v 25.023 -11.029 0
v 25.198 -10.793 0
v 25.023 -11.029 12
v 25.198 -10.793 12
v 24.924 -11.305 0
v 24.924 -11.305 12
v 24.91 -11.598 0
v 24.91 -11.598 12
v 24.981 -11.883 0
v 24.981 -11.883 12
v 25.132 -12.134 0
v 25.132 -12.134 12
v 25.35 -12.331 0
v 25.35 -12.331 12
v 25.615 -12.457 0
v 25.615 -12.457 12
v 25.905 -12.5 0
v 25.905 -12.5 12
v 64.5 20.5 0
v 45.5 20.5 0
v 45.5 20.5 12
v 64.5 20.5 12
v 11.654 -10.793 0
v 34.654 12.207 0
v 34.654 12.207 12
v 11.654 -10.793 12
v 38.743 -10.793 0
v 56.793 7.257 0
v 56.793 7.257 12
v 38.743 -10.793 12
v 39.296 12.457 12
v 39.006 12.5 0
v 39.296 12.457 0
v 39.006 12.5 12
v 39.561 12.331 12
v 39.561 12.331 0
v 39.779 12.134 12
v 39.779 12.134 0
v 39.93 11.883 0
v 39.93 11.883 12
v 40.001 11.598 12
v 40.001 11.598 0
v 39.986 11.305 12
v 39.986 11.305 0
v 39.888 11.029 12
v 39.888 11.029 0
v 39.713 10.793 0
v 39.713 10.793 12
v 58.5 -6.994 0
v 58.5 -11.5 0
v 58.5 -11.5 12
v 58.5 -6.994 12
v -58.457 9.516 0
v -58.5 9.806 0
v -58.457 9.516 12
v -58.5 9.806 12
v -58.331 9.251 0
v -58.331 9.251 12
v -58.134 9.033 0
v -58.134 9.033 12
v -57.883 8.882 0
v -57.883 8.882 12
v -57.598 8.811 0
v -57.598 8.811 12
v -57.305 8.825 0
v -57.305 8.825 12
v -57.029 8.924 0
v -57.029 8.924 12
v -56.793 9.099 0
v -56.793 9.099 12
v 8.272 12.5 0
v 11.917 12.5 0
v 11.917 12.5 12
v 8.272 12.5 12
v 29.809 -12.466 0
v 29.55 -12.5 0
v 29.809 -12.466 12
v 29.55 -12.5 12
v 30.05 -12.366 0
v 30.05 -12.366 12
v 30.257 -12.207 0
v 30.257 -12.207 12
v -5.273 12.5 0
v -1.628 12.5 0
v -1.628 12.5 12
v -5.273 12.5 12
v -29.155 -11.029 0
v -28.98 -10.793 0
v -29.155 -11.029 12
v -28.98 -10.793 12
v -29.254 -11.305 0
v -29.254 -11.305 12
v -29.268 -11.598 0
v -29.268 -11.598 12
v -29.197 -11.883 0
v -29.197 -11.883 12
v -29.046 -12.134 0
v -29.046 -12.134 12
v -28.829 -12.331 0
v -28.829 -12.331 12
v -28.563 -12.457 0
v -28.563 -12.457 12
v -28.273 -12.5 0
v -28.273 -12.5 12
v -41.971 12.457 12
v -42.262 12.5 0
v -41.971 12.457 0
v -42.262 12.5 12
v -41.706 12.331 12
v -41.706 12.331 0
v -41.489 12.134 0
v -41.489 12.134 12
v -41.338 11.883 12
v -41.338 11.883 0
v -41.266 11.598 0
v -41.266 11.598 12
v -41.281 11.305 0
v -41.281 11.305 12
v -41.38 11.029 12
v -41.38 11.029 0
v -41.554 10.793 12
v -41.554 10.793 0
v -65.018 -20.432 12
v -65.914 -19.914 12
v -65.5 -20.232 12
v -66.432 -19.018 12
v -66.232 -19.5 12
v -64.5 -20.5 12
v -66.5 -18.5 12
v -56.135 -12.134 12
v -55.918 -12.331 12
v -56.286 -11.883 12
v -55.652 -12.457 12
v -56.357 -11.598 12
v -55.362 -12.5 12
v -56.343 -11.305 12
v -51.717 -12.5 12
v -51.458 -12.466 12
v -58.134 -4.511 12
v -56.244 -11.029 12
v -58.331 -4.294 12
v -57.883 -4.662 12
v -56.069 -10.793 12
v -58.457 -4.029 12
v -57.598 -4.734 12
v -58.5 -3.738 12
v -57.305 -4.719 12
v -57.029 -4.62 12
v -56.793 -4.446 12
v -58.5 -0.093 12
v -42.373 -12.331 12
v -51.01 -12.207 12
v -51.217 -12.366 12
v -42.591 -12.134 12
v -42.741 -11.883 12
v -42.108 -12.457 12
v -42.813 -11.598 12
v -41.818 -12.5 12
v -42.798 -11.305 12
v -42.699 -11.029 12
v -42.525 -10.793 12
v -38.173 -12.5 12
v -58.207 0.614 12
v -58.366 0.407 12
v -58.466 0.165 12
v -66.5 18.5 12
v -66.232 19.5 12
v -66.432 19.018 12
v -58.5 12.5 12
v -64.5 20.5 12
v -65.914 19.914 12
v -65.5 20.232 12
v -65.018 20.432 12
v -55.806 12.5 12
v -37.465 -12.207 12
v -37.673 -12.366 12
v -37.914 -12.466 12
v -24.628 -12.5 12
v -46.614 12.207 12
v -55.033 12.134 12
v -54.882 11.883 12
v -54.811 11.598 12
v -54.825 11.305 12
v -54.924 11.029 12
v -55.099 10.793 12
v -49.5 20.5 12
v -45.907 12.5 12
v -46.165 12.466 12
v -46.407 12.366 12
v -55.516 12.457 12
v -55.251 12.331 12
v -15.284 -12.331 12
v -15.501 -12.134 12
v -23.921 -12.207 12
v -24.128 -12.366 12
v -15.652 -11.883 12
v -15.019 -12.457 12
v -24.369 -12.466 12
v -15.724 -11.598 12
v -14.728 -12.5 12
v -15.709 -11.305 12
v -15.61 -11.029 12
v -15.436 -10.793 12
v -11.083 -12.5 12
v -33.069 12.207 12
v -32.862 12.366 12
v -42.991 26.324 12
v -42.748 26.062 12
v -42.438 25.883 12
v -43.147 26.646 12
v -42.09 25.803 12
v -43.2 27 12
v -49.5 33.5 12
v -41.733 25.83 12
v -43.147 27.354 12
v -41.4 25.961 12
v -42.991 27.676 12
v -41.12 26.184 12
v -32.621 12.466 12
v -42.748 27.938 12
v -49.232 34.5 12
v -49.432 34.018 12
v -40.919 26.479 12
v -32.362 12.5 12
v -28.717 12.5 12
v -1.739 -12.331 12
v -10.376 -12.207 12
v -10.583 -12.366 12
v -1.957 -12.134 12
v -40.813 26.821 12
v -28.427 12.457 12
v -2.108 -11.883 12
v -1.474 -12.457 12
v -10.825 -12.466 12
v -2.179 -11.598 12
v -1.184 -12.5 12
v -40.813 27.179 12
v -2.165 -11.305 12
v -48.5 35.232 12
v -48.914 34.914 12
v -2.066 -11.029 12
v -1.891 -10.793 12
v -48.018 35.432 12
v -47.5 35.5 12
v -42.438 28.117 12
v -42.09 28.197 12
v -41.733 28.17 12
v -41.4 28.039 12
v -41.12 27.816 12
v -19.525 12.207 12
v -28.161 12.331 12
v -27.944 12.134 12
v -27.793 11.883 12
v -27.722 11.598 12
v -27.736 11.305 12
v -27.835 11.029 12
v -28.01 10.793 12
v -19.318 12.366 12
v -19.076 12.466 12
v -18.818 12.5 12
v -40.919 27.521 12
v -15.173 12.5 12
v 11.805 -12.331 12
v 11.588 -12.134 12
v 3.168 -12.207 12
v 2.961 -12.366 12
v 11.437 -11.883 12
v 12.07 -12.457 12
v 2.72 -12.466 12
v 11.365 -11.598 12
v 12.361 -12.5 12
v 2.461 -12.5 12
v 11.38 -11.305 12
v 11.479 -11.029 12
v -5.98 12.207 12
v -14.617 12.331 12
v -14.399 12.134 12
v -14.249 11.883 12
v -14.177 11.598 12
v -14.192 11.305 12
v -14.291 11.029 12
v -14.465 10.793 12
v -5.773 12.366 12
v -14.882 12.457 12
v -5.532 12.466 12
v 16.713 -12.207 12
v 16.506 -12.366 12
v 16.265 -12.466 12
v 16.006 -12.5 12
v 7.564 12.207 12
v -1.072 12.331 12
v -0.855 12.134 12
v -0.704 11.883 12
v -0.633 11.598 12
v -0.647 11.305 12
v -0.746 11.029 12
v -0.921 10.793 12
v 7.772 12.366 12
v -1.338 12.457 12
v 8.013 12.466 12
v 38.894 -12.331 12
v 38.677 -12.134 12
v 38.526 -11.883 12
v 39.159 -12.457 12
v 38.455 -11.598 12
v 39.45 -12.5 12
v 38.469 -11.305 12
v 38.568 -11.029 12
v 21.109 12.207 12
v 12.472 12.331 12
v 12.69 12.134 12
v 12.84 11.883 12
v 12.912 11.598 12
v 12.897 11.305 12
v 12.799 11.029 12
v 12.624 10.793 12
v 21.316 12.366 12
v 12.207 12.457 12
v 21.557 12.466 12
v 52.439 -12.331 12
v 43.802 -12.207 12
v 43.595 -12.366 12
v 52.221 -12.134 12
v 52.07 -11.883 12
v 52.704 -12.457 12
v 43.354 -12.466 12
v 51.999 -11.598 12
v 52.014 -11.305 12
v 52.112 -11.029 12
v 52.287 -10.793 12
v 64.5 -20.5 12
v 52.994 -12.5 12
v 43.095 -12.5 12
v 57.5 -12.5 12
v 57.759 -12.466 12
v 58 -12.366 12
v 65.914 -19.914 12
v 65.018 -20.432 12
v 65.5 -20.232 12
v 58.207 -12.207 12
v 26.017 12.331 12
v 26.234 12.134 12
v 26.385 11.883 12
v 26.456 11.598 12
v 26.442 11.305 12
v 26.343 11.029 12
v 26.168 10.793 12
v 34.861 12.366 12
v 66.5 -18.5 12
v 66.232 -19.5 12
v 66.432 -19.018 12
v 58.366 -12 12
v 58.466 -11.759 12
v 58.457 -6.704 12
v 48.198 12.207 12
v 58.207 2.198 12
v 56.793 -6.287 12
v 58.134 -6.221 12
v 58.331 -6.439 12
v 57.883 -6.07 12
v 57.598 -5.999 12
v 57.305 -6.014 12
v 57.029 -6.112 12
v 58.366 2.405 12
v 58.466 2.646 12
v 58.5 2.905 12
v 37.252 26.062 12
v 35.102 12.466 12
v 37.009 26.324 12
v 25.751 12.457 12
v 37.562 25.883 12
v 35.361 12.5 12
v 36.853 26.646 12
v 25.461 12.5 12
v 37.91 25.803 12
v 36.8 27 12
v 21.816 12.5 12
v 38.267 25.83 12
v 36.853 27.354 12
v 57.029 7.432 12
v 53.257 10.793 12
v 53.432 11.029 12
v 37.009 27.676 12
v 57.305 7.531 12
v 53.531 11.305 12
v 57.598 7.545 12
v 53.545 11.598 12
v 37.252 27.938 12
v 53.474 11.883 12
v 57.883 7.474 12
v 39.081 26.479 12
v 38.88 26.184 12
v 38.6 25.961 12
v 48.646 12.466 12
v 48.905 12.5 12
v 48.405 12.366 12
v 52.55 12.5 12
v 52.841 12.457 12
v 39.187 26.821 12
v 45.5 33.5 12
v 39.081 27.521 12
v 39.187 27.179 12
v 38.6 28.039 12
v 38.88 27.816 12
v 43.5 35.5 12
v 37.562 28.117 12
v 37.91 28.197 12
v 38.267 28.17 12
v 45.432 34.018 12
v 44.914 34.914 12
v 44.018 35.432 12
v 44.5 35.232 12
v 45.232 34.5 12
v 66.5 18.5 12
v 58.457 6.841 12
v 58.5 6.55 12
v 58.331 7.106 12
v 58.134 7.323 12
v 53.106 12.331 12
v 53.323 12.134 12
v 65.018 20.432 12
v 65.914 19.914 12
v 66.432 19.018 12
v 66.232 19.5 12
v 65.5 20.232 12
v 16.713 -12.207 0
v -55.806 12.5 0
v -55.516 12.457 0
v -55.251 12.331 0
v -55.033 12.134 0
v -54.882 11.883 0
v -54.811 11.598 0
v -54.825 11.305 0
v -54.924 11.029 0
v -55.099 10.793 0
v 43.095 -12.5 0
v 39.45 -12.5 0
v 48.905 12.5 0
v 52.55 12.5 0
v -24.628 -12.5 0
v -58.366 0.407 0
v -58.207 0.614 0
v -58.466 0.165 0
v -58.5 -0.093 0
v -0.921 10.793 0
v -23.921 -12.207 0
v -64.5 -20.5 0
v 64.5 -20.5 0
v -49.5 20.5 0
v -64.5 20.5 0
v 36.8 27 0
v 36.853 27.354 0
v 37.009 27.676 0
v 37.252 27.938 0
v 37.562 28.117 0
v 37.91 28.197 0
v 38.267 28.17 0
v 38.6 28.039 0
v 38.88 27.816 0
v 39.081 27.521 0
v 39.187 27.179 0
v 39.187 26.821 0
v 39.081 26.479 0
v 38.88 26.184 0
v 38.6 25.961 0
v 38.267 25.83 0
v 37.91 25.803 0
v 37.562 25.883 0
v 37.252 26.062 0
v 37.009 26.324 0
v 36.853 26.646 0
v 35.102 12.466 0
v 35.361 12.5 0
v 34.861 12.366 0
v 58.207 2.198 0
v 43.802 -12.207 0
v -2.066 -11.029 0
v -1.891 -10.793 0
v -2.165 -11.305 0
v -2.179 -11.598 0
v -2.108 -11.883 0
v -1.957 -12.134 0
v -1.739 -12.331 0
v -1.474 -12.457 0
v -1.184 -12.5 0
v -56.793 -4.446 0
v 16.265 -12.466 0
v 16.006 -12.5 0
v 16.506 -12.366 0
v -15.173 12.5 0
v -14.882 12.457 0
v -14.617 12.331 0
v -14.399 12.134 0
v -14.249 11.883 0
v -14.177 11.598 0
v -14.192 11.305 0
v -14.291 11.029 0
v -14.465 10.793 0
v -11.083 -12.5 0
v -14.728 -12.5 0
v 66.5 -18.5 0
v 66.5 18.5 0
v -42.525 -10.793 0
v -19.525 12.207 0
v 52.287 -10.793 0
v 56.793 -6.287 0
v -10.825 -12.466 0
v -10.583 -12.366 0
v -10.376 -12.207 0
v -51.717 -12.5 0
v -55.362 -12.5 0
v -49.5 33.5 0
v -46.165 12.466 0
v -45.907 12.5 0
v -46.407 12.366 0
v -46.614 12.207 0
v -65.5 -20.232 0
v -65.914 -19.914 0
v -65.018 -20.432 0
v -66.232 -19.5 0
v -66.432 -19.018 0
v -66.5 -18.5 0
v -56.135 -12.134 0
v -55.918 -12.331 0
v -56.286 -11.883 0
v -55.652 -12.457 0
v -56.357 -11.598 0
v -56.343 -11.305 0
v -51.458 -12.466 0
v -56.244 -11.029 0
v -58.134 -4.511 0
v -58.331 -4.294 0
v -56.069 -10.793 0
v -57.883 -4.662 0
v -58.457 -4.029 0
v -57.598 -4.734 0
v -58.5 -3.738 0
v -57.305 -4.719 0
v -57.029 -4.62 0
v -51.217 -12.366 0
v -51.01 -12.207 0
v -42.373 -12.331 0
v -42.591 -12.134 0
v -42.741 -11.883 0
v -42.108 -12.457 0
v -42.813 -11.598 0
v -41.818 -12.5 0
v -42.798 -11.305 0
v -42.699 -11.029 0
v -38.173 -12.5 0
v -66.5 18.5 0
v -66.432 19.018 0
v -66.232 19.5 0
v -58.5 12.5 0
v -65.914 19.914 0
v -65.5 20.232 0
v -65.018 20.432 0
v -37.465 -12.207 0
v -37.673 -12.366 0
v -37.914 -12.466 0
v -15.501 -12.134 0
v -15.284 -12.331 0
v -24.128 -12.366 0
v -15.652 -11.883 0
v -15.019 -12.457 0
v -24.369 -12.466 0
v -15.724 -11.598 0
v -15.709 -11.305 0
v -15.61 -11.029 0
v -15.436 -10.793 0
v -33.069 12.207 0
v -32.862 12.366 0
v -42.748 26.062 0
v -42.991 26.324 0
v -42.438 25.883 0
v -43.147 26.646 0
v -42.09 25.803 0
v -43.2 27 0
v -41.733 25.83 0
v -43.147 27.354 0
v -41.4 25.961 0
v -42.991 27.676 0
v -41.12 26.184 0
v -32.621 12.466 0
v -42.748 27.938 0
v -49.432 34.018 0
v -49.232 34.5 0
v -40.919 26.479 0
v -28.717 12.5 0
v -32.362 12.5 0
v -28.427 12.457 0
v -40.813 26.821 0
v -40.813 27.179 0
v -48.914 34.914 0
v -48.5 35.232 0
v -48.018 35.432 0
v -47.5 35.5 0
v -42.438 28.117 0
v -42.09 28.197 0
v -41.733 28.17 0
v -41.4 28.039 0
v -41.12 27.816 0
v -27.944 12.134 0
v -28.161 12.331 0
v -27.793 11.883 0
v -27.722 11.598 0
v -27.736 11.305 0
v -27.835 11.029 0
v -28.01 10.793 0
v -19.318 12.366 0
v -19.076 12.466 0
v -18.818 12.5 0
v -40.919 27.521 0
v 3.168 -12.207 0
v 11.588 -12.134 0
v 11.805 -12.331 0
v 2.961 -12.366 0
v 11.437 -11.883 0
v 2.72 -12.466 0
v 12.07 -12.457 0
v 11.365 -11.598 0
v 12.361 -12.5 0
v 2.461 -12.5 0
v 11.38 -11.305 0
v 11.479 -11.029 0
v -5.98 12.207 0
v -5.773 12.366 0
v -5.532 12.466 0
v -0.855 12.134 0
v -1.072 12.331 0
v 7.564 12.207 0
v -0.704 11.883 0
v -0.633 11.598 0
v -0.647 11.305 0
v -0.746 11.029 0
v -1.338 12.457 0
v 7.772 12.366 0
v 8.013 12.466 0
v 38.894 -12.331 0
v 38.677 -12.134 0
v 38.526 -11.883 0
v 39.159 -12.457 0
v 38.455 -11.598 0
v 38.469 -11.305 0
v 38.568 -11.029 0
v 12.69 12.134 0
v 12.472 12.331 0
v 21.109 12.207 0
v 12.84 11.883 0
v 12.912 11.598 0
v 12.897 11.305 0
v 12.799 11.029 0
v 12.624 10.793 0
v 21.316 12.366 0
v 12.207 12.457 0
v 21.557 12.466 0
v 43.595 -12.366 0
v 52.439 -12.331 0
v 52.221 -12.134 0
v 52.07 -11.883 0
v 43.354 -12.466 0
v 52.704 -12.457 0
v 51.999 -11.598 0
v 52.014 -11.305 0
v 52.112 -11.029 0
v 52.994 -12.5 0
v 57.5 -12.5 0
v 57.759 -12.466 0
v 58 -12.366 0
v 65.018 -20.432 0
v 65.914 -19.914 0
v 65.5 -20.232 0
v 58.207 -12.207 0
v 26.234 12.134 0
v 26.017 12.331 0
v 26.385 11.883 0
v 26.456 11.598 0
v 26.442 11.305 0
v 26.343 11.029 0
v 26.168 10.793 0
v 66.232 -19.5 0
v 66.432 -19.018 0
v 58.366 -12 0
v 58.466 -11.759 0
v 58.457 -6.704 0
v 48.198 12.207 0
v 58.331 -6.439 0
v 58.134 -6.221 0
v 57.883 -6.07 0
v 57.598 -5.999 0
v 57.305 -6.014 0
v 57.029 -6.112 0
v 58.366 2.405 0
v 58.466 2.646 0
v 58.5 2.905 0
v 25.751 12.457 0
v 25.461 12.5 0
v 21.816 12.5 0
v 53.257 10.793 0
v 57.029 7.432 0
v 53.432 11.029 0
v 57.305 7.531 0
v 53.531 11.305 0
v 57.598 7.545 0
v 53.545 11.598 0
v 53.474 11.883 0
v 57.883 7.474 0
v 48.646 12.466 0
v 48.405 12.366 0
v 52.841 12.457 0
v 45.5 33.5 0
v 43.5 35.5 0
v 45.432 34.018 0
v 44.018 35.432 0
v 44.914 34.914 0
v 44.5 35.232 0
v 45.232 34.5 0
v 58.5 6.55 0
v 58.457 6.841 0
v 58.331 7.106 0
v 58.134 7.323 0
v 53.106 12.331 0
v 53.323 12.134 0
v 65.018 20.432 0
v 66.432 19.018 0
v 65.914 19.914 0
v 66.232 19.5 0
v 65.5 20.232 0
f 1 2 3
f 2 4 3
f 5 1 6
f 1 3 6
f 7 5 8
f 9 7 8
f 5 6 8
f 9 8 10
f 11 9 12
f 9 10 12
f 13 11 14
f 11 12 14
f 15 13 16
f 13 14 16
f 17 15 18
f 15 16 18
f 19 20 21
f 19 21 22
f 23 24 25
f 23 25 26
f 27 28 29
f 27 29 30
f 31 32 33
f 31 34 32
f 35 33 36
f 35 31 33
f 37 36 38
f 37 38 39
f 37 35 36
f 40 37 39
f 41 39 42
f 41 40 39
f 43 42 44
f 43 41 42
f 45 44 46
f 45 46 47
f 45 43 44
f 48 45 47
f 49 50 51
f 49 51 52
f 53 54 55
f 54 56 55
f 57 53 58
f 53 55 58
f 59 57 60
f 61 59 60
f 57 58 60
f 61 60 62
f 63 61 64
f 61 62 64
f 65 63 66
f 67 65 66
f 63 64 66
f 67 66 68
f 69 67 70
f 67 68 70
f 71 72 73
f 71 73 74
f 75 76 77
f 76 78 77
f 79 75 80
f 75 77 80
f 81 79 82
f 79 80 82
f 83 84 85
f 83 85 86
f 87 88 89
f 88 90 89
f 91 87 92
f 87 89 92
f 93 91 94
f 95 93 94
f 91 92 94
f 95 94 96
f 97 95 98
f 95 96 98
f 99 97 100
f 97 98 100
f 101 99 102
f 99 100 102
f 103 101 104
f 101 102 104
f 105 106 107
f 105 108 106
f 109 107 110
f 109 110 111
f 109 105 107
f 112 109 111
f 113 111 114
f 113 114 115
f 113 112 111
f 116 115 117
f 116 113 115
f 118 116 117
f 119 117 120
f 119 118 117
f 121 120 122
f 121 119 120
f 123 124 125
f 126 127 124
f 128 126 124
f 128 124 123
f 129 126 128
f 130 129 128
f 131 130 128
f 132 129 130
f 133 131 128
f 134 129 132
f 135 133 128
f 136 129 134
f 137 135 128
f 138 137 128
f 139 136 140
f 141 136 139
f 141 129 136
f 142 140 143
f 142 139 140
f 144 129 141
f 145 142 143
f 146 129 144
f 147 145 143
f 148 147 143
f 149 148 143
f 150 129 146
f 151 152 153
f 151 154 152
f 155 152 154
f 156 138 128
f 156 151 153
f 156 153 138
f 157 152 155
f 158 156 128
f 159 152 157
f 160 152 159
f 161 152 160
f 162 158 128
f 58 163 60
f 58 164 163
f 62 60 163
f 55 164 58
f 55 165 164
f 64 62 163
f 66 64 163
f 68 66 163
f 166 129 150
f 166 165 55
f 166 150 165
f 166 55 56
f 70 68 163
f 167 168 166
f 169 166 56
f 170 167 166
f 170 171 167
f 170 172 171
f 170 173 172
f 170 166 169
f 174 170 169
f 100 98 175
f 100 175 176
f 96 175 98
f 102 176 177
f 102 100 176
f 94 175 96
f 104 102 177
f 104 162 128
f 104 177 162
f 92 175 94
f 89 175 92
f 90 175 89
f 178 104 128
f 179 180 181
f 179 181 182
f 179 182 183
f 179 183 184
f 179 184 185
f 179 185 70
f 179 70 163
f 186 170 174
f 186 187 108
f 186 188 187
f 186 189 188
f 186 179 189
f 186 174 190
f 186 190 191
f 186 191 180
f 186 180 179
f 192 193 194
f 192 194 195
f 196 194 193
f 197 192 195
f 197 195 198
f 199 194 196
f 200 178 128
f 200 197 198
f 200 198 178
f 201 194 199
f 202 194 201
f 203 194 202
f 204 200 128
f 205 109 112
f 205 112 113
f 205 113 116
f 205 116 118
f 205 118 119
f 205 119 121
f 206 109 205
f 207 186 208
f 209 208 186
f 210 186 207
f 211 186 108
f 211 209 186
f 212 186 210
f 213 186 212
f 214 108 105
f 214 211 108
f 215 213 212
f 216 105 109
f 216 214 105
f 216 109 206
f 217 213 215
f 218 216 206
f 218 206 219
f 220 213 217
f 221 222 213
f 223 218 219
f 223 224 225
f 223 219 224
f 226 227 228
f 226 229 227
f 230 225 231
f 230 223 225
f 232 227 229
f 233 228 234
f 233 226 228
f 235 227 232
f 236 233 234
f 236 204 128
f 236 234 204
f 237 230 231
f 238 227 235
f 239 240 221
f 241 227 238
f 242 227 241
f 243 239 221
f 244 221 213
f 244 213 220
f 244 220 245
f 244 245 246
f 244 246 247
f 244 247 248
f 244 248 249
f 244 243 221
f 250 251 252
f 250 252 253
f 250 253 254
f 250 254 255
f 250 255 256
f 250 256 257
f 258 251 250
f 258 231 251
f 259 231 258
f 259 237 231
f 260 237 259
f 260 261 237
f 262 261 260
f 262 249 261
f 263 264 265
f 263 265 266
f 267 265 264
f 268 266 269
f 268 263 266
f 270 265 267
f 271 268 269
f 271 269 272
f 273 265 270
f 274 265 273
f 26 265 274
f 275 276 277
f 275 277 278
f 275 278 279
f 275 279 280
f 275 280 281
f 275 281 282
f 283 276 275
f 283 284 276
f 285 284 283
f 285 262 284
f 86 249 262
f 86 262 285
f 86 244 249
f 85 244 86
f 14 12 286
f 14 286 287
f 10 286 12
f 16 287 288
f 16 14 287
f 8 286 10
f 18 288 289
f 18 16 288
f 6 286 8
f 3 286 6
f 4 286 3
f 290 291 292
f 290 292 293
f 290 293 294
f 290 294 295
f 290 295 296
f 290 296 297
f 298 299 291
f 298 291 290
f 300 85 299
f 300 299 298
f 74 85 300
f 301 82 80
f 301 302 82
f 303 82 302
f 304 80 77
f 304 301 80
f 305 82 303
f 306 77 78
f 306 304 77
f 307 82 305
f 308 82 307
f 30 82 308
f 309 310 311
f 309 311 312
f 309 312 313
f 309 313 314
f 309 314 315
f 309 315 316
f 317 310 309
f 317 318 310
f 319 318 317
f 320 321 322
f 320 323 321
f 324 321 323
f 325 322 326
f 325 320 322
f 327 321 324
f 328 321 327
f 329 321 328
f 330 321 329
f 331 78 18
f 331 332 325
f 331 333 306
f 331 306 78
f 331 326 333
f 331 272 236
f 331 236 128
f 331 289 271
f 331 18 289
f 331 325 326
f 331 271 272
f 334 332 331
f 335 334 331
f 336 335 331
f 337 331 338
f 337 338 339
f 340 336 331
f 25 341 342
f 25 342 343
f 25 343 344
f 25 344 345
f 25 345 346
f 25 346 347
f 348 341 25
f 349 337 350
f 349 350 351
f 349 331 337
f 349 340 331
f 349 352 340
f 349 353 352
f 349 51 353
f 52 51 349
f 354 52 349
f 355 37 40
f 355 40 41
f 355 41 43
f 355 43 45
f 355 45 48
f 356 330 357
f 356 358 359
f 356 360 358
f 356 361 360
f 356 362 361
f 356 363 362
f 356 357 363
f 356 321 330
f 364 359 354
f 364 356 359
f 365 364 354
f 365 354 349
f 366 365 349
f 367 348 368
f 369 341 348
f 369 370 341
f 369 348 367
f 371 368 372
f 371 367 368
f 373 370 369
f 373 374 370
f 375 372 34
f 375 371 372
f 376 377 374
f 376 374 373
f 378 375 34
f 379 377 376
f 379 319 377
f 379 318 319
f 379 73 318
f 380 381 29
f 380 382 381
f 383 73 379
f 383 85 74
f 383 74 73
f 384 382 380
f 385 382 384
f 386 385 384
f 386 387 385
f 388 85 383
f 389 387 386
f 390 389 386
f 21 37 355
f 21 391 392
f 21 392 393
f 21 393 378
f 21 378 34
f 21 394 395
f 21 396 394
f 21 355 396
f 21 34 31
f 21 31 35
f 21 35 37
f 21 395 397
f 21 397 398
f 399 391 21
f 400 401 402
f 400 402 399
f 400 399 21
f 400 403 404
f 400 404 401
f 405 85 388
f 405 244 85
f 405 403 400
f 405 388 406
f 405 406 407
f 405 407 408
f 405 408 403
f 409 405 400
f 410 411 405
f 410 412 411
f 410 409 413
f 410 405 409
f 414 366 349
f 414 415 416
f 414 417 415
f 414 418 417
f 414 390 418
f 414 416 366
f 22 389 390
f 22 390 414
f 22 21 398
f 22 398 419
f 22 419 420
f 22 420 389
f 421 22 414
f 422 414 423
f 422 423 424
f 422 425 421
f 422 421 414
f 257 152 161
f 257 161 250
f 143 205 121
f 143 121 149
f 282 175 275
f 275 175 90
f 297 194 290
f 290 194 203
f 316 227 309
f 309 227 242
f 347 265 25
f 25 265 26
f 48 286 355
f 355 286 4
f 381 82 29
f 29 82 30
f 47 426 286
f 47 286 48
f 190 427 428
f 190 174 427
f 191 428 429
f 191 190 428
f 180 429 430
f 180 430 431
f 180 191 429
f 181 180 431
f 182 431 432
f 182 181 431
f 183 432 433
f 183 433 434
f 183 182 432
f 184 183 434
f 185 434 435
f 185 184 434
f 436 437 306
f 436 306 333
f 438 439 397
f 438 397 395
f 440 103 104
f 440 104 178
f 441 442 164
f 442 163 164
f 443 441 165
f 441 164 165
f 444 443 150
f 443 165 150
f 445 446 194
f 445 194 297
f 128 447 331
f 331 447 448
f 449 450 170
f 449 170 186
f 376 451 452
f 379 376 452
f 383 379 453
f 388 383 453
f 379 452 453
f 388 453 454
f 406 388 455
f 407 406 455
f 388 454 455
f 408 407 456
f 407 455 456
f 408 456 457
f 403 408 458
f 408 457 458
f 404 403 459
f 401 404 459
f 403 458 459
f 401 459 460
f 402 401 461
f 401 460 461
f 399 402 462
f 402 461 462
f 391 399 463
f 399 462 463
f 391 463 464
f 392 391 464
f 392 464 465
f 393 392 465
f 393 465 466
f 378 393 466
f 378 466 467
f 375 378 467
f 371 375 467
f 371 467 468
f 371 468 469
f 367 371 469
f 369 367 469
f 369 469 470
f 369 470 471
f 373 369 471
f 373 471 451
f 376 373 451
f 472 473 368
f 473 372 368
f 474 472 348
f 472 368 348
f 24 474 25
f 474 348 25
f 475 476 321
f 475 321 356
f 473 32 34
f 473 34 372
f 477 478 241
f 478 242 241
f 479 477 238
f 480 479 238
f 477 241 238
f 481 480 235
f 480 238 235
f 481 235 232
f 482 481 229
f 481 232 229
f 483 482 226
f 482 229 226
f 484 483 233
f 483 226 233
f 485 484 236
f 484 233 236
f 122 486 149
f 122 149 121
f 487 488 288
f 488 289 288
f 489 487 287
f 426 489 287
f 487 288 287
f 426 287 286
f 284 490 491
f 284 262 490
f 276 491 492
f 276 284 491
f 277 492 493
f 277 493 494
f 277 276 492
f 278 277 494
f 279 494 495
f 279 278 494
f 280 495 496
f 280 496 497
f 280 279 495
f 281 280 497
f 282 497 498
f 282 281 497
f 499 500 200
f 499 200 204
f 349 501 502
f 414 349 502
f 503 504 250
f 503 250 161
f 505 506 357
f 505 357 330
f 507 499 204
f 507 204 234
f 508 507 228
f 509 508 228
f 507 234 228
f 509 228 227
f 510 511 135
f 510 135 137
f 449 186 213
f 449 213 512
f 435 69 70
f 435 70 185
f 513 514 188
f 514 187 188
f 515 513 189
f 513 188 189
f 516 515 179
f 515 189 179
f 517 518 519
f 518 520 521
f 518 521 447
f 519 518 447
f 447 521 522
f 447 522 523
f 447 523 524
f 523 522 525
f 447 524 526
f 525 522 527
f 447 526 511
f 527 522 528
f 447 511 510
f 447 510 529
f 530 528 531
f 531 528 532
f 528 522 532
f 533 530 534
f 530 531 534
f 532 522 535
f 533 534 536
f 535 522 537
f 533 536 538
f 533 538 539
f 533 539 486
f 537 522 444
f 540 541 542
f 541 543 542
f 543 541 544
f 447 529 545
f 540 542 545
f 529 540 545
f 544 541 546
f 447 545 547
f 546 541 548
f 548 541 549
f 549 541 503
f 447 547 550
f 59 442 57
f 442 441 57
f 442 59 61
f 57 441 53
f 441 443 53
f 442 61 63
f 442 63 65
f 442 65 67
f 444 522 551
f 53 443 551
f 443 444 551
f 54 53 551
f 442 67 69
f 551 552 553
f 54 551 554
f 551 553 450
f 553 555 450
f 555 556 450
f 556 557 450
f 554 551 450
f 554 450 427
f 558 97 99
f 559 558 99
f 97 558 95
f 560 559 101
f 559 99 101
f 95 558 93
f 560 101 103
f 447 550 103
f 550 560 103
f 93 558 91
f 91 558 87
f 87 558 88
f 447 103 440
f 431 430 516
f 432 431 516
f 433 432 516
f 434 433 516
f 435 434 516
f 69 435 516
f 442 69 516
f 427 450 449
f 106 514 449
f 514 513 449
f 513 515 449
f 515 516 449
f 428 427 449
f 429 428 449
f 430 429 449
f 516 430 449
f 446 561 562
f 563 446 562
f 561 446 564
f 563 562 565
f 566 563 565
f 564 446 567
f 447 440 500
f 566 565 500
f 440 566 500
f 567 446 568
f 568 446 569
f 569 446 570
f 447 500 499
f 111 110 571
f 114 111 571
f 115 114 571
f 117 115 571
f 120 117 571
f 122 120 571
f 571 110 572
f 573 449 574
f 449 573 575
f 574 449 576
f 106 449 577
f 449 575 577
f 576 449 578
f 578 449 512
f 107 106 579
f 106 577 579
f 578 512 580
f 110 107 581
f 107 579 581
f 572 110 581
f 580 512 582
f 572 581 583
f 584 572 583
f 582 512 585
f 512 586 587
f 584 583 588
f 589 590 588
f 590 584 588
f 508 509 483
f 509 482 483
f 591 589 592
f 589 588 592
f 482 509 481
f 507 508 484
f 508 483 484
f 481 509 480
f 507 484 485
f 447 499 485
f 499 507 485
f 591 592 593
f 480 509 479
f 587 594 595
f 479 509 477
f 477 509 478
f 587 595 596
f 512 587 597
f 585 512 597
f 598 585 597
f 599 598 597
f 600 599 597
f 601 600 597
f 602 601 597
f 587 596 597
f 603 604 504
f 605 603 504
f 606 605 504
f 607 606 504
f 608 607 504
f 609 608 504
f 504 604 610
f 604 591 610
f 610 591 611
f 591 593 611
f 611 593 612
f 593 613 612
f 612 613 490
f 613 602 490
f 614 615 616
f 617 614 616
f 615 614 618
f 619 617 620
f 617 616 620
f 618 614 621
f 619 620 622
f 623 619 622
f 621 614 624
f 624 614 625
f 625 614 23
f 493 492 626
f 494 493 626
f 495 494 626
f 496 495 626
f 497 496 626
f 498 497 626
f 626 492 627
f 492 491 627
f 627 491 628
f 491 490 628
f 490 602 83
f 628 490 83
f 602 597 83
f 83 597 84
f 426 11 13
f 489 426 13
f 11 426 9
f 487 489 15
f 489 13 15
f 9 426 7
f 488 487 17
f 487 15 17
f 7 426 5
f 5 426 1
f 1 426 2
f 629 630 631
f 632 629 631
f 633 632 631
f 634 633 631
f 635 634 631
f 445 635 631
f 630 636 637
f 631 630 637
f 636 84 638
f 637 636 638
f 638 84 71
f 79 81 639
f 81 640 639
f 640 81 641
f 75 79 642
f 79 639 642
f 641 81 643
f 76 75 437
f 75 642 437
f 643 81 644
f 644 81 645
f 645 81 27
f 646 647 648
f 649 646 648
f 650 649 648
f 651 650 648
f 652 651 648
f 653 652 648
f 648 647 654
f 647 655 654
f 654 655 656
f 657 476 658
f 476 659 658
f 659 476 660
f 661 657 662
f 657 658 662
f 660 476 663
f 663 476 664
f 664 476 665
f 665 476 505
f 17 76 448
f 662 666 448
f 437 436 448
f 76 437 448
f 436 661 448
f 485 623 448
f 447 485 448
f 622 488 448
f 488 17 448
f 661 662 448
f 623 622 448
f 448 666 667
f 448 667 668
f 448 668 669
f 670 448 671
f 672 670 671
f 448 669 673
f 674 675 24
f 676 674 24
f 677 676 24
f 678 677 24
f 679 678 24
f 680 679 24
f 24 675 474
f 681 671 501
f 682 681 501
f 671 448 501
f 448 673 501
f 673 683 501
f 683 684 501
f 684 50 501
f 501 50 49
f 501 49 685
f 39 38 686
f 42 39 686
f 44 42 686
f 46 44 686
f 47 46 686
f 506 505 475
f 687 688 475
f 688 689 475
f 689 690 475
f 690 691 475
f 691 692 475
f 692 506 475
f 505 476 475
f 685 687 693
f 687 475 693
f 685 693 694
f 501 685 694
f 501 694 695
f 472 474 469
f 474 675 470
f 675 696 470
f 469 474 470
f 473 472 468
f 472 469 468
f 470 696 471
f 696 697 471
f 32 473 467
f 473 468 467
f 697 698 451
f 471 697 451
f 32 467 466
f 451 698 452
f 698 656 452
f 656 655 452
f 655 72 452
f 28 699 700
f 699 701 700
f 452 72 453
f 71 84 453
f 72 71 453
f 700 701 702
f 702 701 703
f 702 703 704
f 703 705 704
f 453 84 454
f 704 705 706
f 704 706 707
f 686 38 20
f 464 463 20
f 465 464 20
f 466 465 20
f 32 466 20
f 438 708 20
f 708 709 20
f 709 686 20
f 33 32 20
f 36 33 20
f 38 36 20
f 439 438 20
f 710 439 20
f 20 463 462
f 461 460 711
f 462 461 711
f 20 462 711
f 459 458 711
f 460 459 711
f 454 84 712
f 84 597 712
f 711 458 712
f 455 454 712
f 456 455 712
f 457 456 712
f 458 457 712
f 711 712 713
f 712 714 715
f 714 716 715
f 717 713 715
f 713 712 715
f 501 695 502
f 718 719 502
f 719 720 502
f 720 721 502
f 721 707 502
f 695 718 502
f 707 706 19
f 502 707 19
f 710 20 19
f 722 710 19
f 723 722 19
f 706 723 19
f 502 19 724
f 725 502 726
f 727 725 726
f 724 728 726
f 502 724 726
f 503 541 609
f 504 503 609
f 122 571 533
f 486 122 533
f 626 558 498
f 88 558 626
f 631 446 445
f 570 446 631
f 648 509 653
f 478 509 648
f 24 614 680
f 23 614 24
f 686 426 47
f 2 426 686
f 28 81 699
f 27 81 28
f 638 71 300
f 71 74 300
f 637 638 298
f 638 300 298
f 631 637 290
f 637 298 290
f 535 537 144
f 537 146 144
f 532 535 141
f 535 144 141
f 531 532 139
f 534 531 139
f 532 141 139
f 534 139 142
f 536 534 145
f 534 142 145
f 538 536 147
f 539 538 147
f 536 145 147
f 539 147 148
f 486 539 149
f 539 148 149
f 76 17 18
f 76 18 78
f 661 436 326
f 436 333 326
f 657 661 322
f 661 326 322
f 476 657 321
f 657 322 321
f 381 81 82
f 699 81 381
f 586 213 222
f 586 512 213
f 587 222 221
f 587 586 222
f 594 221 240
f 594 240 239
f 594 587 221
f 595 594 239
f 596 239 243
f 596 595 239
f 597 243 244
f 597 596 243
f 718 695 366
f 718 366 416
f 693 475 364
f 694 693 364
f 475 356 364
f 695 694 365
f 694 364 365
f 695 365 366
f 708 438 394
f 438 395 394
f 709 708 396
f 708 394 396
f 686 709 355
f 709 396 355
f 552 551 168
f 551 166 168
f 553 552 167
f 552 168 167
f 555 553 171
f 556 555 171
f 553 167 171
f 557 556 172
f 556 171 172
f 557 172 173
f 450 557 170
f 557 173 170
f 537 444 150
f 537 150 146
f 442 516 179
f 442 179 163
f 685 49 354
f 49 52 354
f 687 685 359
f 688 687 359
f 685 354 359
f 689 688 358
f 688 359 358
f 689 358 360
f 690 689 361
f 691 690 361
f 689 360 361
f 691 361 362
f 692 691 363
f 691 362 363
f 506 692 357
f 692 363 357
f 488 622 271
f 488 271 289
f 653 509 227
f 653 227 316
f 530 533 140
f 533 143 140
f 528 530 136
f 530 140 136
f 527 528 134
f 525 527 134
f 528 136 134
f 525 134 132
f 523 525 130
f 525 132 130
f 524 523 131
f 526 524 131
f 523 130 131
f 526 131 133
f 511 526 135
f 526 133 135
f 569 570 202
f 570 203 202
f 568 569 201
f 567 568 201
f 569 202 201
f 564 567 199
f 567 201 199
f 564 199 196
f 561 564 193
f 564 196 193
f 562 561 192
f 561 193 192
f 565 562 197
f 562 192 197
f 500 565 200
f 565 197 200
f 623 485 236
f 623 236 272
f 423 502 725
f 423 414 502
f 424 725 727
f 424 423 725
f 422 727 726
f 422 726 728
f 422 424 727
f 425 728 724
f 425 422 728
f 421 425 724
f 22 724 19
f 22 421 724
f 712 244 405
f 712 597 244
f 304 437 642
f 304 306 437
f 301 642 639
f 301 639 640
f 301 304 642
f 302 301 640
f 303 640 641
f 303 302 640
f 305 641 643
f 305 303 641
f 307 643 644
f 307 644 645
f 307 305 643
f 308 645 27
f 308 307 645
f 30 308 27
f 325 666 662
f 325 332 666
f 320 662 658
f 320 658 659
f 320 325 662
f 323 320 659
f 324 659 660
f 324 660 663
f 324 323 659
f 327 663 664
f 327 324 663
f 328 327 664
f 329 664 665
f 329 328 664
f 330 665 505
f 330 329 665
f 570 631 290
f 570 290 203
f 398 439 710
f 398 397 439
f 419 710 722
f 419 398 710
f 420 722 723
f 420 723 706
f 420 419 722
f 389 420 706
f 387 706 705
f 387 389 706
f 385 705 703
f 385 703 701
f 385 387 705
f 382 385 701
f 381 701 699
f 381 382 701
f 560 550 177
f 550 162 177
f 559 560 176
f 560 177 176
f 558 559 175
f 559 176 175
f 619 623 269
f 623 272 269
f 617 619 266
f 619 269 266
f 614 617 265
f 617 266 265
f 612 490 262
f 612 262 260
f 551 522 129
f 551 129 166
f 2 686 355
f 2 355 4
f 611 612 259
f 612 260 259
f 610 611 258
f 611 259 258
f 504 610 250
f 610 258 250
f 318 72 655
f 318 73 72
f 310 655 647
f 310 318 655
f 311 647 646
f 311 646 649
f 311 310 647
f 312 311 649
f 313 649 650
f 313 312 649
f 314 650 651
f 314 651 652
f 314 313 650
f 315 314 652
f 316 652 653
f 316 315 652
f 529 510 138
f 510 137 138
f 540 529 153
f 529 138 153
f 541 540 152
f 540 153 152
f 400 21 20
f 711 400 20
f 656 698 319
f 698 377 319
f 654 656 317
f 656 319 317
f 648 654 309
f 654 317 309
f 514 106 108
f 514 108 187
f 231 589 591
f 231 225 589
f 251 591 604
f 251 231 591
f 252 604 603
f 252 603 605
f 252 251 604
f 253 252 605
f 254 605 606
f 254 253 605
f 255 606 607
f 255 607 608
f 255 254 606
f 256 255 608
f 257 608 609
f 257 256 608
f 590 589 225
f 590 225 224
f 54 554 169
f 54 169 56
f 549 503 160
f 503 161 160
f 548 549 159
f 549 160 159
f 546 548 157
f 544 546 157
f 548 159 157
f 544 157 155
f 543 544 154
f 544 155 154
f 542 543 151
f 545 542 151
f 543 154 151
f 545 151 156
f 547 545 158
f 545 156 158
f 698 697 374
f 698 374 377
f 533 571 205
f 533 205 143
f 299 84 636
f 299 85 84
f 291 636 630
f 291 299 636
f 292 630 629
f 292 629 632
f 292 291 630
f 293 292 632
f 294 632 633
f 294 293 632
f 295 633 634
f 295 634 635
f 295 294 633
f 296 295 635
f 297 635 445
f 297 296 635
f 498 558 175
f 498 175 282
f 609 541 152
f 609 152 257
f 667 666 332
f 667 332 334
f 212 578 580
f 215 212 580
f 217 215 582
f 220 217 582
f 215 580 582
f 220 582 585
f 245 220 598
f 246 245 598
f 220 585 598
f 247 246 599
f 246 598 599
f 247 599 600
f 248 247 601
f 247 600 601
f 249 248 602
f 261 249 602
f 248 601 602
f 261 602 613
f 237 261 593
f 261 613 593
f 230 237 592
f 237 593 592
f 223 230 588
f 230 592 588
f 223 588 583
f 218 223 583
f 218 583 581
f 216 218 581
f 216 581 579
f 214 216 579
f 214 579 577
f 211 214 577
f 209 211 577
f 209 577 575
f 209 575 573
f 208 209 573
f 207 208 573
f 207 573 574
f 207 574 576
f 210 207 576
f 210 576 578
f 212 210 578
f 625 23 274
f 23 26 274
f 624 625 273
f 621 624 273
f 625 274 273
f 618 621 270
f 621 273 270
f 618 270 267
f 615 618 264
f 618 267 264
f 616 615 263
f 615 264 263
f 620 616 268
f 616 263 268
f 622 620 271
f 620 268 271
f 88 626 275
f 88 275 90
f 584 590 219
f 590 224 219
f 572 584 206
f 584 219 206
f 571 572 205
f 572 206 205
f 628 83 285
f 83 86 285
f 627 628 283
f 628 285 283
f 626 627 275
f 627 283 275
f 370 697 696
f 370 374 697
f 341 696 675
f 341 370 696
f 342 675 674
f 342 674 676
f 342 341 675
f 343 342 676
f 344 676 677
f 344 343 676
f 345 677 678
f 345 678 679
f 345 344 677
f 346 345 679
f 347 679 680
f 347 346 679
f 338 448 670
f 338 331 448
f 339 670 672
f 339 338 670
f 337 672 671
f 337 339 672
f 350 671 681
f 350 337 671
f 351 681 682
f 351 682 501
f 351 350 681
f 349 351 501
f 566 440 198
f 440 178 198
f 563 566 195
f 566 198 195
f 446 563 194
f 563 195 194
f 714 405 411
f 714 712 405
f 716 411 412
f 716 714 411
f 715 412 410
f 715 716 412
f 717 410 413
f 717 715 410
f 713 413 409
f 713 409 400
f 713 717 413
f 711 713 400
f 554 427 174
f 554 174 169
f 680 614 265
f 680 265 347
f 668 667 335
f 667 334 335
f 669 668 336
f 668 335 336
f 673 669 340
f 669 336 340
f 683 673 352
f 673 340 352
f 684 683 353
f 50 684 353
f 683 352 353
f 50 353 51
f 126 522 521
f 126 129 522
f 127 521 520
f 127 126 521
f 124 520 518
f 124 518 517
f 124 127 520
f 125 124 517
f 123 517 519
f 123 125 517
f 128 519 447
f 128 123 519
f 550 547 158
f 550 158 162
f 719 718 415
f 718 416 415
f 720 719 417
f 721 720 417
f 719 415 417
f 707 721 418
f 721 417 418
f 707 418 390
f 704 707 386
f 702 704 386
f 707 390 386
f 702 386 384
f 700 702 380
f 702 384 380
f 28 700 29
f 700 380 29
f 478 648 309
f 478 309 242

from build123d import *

# Parameters (mm, degrees)
SKETCH1_W            = 133
SKETCH1_H            = 41
BOSS_EXTRUDE1_DEPTH  = 12
SKETCH2_W            = 95
SKETCH2_H            = 12
BOSS_EXTRUDE2_DEPTH  = 15
FILLET1_R            = 2
M2_CLEARANCE_HOLE1_D = 2.4
VENT1_DEPTH          = 12
FILLET2_R            = 1


# Read off the part's stored shape, not the designer's step: Vent1
with BuildPart() as part:
    # Sketch1 → Boss-Extrude1 (new body)
    with BuildSketch(Plane.XY):
        Rectangle(SKETCH1_W, SKETCH1_H)
    extrude(amount=BOSS_EXTRUDE1_DEPTH)

    # Sketch2 → Boss-Extrude2 (add)
    with BuildSketch(Plane(origin=(0, 20.5, 0), x_dir=(1, 0, 0), z_dir=(0, 1, 0))):
        with Locations((-2, -6)):
            Rectangle(SKETCH2_W, SKETCH2_H)
    extrude(amount=BOSS_EXTRUDE2_DEPTH)

    # Fillet1
    fillet1_edges = [part.edges().sort_by_distance(p)[0] for p in [
        (-49.5, 35.5, 6),
        (45.5, 35.5, 6),
        (-66.5, 20.5, 6),
        (66.5, 20.5, 6),
        (66.5, -20.5, 6),
        (-66.5, -20.5, 6),
    ]]
    fillet(fillet1_edges, radius=FILLET1_R)

    # M2 Clearance Hole1 (through all)
    with Locations(Plane(origin=(-42, 27, 12), x_dir=(1, 0, 0), z_dir=(0, 0, 1))):
        with Locations((0, 0), (80, 0)):
            Hole(M2_CLEARANCE_HOLE1_D / 2)

    # Vent1 outline → Vent1 (cut)
    with BuildSketch(Plane.XY):
        Polygon((-39.847390778, 12.5), (-46.320873948, 12.5), (-58.5, 0.320873948), (-58.5, -6.152609222), align=None)
        Polygon((-26.302839797, 12.5), (-32.776322967, 12.5), (-57.776322967, -12.5), (-51.302839797, -12.5), align=None)
        Polygon((-12.758288815, 12.5), (-19.231771985, 12.5), (-44.231771985, -12.5), (-37.758288815, -12.5), align=None)
        Polygon((0.786262167, 12.5), (-5.687221003, 12.5), (-30.687221003, -12.5), (-24.213737833, -12.5), align=None)
        Polygon((14.330813149, 12.5), (7.857329979, 12.5), (-17.142670021, -12.5), (-10.669186851, -12.5), align=None)
        Polygon((27.875364131, 12.5), (21.401880961, 12.5), (-3.598119039, -12.5), (2.875364131, -12.5), align=None)
        Polygon((-53.39194176, 12.5), (-58.5, 12.5), (-58.5, 7.39194176), align=None)
        Polygon((41.419915112, 12.5), (34.946431942, 12.5), (9.946431942, -12.5), (16.419915112, -12.5), align=None)
        Polygon((54.964466094, 12.5), (48.490982924, 12.5), (23.490982924, -12.5), (29.964466094, -12.5), align=None)
        Polygon((37.035533906, -12.5), (43.509017076, -12.5), (58.5, 2.490982924), (58.5, 8.964466094), align=None)
        Polygon((50.580084888, -12.5), (58.5, -12.5), (58.5, -4.580084888), align=None)
    extrude(amount=VENT1_DEPTH, mode=Mode.SUBTRACT)

    # Fillet2
    fillet2_edges = [part.edges().sort_by_distance(p)[0] for p in [
        (50.580084888, -12.5, 6),
        (43.509017076, -12.5, 6),
        (58.5, 2.490982924, 6),
        (58.5, -4.580084888, 6),
        (37.035533906, -12.5, 6),
        (29.964466094, -12.5, 6),
        (54.964466094, 12.5, 6),
        (58.5, 8.964466094, 6),
        (23.490982924, -12.5, 6),
        (16.419915112, -12.5, 6),
        (41.419915112, 12.5, 6),
        (48.490982924, 12.5, 6),
        (9.946431942, -12.5, 6),
        (2.875364131, -12.5, 6),
        (27.875364131, 12.5, 6),
        (34.946431942, 12.5, 6),
        (14.330813149, 12.5, 6),
        (21.401880961, 12.5, 6),
        (-3.598119039, -12.5, 6),
        (-10.669186851, -12.5, 6),
        (0.786262167, 12.5, 6),
        (7.857329979, 12.5, 6),
        (-17.142670021, -12.5, 6),
        (-24.213737833, -12.5, 6),
        (-12.758288815, 12.5, 6),
        (-5.687221003, 12.5, 6),
        (-30.687221003, -12.5, 6),
        (-37.758288815, -12.5, 6),
        (-26.302839797, 12.5, 6),
        (-19.231771985, 12.5, 6),
        (-44.231771985, -12.5, 6),
        (-51.302839797, -12.5, 6),
        (-39.847390778, 12.5, 6),
        (-32.776322967, 12.5, 6),
        (-57.776322967, -12.5, 6),
        (-58.5, -6.152609222, 6),
        (-53.39194176, 12.5, 6),
        (-46.320873948, 12.5, 6),
        (-58.5, 0.320873948, 6),
        (-58.5, 7.39194176, 6),
        (58.5, -12.5, 6),
    ]]
    fillet(fillet2_edges, radius=FILLET2_R)


solid = part.part
